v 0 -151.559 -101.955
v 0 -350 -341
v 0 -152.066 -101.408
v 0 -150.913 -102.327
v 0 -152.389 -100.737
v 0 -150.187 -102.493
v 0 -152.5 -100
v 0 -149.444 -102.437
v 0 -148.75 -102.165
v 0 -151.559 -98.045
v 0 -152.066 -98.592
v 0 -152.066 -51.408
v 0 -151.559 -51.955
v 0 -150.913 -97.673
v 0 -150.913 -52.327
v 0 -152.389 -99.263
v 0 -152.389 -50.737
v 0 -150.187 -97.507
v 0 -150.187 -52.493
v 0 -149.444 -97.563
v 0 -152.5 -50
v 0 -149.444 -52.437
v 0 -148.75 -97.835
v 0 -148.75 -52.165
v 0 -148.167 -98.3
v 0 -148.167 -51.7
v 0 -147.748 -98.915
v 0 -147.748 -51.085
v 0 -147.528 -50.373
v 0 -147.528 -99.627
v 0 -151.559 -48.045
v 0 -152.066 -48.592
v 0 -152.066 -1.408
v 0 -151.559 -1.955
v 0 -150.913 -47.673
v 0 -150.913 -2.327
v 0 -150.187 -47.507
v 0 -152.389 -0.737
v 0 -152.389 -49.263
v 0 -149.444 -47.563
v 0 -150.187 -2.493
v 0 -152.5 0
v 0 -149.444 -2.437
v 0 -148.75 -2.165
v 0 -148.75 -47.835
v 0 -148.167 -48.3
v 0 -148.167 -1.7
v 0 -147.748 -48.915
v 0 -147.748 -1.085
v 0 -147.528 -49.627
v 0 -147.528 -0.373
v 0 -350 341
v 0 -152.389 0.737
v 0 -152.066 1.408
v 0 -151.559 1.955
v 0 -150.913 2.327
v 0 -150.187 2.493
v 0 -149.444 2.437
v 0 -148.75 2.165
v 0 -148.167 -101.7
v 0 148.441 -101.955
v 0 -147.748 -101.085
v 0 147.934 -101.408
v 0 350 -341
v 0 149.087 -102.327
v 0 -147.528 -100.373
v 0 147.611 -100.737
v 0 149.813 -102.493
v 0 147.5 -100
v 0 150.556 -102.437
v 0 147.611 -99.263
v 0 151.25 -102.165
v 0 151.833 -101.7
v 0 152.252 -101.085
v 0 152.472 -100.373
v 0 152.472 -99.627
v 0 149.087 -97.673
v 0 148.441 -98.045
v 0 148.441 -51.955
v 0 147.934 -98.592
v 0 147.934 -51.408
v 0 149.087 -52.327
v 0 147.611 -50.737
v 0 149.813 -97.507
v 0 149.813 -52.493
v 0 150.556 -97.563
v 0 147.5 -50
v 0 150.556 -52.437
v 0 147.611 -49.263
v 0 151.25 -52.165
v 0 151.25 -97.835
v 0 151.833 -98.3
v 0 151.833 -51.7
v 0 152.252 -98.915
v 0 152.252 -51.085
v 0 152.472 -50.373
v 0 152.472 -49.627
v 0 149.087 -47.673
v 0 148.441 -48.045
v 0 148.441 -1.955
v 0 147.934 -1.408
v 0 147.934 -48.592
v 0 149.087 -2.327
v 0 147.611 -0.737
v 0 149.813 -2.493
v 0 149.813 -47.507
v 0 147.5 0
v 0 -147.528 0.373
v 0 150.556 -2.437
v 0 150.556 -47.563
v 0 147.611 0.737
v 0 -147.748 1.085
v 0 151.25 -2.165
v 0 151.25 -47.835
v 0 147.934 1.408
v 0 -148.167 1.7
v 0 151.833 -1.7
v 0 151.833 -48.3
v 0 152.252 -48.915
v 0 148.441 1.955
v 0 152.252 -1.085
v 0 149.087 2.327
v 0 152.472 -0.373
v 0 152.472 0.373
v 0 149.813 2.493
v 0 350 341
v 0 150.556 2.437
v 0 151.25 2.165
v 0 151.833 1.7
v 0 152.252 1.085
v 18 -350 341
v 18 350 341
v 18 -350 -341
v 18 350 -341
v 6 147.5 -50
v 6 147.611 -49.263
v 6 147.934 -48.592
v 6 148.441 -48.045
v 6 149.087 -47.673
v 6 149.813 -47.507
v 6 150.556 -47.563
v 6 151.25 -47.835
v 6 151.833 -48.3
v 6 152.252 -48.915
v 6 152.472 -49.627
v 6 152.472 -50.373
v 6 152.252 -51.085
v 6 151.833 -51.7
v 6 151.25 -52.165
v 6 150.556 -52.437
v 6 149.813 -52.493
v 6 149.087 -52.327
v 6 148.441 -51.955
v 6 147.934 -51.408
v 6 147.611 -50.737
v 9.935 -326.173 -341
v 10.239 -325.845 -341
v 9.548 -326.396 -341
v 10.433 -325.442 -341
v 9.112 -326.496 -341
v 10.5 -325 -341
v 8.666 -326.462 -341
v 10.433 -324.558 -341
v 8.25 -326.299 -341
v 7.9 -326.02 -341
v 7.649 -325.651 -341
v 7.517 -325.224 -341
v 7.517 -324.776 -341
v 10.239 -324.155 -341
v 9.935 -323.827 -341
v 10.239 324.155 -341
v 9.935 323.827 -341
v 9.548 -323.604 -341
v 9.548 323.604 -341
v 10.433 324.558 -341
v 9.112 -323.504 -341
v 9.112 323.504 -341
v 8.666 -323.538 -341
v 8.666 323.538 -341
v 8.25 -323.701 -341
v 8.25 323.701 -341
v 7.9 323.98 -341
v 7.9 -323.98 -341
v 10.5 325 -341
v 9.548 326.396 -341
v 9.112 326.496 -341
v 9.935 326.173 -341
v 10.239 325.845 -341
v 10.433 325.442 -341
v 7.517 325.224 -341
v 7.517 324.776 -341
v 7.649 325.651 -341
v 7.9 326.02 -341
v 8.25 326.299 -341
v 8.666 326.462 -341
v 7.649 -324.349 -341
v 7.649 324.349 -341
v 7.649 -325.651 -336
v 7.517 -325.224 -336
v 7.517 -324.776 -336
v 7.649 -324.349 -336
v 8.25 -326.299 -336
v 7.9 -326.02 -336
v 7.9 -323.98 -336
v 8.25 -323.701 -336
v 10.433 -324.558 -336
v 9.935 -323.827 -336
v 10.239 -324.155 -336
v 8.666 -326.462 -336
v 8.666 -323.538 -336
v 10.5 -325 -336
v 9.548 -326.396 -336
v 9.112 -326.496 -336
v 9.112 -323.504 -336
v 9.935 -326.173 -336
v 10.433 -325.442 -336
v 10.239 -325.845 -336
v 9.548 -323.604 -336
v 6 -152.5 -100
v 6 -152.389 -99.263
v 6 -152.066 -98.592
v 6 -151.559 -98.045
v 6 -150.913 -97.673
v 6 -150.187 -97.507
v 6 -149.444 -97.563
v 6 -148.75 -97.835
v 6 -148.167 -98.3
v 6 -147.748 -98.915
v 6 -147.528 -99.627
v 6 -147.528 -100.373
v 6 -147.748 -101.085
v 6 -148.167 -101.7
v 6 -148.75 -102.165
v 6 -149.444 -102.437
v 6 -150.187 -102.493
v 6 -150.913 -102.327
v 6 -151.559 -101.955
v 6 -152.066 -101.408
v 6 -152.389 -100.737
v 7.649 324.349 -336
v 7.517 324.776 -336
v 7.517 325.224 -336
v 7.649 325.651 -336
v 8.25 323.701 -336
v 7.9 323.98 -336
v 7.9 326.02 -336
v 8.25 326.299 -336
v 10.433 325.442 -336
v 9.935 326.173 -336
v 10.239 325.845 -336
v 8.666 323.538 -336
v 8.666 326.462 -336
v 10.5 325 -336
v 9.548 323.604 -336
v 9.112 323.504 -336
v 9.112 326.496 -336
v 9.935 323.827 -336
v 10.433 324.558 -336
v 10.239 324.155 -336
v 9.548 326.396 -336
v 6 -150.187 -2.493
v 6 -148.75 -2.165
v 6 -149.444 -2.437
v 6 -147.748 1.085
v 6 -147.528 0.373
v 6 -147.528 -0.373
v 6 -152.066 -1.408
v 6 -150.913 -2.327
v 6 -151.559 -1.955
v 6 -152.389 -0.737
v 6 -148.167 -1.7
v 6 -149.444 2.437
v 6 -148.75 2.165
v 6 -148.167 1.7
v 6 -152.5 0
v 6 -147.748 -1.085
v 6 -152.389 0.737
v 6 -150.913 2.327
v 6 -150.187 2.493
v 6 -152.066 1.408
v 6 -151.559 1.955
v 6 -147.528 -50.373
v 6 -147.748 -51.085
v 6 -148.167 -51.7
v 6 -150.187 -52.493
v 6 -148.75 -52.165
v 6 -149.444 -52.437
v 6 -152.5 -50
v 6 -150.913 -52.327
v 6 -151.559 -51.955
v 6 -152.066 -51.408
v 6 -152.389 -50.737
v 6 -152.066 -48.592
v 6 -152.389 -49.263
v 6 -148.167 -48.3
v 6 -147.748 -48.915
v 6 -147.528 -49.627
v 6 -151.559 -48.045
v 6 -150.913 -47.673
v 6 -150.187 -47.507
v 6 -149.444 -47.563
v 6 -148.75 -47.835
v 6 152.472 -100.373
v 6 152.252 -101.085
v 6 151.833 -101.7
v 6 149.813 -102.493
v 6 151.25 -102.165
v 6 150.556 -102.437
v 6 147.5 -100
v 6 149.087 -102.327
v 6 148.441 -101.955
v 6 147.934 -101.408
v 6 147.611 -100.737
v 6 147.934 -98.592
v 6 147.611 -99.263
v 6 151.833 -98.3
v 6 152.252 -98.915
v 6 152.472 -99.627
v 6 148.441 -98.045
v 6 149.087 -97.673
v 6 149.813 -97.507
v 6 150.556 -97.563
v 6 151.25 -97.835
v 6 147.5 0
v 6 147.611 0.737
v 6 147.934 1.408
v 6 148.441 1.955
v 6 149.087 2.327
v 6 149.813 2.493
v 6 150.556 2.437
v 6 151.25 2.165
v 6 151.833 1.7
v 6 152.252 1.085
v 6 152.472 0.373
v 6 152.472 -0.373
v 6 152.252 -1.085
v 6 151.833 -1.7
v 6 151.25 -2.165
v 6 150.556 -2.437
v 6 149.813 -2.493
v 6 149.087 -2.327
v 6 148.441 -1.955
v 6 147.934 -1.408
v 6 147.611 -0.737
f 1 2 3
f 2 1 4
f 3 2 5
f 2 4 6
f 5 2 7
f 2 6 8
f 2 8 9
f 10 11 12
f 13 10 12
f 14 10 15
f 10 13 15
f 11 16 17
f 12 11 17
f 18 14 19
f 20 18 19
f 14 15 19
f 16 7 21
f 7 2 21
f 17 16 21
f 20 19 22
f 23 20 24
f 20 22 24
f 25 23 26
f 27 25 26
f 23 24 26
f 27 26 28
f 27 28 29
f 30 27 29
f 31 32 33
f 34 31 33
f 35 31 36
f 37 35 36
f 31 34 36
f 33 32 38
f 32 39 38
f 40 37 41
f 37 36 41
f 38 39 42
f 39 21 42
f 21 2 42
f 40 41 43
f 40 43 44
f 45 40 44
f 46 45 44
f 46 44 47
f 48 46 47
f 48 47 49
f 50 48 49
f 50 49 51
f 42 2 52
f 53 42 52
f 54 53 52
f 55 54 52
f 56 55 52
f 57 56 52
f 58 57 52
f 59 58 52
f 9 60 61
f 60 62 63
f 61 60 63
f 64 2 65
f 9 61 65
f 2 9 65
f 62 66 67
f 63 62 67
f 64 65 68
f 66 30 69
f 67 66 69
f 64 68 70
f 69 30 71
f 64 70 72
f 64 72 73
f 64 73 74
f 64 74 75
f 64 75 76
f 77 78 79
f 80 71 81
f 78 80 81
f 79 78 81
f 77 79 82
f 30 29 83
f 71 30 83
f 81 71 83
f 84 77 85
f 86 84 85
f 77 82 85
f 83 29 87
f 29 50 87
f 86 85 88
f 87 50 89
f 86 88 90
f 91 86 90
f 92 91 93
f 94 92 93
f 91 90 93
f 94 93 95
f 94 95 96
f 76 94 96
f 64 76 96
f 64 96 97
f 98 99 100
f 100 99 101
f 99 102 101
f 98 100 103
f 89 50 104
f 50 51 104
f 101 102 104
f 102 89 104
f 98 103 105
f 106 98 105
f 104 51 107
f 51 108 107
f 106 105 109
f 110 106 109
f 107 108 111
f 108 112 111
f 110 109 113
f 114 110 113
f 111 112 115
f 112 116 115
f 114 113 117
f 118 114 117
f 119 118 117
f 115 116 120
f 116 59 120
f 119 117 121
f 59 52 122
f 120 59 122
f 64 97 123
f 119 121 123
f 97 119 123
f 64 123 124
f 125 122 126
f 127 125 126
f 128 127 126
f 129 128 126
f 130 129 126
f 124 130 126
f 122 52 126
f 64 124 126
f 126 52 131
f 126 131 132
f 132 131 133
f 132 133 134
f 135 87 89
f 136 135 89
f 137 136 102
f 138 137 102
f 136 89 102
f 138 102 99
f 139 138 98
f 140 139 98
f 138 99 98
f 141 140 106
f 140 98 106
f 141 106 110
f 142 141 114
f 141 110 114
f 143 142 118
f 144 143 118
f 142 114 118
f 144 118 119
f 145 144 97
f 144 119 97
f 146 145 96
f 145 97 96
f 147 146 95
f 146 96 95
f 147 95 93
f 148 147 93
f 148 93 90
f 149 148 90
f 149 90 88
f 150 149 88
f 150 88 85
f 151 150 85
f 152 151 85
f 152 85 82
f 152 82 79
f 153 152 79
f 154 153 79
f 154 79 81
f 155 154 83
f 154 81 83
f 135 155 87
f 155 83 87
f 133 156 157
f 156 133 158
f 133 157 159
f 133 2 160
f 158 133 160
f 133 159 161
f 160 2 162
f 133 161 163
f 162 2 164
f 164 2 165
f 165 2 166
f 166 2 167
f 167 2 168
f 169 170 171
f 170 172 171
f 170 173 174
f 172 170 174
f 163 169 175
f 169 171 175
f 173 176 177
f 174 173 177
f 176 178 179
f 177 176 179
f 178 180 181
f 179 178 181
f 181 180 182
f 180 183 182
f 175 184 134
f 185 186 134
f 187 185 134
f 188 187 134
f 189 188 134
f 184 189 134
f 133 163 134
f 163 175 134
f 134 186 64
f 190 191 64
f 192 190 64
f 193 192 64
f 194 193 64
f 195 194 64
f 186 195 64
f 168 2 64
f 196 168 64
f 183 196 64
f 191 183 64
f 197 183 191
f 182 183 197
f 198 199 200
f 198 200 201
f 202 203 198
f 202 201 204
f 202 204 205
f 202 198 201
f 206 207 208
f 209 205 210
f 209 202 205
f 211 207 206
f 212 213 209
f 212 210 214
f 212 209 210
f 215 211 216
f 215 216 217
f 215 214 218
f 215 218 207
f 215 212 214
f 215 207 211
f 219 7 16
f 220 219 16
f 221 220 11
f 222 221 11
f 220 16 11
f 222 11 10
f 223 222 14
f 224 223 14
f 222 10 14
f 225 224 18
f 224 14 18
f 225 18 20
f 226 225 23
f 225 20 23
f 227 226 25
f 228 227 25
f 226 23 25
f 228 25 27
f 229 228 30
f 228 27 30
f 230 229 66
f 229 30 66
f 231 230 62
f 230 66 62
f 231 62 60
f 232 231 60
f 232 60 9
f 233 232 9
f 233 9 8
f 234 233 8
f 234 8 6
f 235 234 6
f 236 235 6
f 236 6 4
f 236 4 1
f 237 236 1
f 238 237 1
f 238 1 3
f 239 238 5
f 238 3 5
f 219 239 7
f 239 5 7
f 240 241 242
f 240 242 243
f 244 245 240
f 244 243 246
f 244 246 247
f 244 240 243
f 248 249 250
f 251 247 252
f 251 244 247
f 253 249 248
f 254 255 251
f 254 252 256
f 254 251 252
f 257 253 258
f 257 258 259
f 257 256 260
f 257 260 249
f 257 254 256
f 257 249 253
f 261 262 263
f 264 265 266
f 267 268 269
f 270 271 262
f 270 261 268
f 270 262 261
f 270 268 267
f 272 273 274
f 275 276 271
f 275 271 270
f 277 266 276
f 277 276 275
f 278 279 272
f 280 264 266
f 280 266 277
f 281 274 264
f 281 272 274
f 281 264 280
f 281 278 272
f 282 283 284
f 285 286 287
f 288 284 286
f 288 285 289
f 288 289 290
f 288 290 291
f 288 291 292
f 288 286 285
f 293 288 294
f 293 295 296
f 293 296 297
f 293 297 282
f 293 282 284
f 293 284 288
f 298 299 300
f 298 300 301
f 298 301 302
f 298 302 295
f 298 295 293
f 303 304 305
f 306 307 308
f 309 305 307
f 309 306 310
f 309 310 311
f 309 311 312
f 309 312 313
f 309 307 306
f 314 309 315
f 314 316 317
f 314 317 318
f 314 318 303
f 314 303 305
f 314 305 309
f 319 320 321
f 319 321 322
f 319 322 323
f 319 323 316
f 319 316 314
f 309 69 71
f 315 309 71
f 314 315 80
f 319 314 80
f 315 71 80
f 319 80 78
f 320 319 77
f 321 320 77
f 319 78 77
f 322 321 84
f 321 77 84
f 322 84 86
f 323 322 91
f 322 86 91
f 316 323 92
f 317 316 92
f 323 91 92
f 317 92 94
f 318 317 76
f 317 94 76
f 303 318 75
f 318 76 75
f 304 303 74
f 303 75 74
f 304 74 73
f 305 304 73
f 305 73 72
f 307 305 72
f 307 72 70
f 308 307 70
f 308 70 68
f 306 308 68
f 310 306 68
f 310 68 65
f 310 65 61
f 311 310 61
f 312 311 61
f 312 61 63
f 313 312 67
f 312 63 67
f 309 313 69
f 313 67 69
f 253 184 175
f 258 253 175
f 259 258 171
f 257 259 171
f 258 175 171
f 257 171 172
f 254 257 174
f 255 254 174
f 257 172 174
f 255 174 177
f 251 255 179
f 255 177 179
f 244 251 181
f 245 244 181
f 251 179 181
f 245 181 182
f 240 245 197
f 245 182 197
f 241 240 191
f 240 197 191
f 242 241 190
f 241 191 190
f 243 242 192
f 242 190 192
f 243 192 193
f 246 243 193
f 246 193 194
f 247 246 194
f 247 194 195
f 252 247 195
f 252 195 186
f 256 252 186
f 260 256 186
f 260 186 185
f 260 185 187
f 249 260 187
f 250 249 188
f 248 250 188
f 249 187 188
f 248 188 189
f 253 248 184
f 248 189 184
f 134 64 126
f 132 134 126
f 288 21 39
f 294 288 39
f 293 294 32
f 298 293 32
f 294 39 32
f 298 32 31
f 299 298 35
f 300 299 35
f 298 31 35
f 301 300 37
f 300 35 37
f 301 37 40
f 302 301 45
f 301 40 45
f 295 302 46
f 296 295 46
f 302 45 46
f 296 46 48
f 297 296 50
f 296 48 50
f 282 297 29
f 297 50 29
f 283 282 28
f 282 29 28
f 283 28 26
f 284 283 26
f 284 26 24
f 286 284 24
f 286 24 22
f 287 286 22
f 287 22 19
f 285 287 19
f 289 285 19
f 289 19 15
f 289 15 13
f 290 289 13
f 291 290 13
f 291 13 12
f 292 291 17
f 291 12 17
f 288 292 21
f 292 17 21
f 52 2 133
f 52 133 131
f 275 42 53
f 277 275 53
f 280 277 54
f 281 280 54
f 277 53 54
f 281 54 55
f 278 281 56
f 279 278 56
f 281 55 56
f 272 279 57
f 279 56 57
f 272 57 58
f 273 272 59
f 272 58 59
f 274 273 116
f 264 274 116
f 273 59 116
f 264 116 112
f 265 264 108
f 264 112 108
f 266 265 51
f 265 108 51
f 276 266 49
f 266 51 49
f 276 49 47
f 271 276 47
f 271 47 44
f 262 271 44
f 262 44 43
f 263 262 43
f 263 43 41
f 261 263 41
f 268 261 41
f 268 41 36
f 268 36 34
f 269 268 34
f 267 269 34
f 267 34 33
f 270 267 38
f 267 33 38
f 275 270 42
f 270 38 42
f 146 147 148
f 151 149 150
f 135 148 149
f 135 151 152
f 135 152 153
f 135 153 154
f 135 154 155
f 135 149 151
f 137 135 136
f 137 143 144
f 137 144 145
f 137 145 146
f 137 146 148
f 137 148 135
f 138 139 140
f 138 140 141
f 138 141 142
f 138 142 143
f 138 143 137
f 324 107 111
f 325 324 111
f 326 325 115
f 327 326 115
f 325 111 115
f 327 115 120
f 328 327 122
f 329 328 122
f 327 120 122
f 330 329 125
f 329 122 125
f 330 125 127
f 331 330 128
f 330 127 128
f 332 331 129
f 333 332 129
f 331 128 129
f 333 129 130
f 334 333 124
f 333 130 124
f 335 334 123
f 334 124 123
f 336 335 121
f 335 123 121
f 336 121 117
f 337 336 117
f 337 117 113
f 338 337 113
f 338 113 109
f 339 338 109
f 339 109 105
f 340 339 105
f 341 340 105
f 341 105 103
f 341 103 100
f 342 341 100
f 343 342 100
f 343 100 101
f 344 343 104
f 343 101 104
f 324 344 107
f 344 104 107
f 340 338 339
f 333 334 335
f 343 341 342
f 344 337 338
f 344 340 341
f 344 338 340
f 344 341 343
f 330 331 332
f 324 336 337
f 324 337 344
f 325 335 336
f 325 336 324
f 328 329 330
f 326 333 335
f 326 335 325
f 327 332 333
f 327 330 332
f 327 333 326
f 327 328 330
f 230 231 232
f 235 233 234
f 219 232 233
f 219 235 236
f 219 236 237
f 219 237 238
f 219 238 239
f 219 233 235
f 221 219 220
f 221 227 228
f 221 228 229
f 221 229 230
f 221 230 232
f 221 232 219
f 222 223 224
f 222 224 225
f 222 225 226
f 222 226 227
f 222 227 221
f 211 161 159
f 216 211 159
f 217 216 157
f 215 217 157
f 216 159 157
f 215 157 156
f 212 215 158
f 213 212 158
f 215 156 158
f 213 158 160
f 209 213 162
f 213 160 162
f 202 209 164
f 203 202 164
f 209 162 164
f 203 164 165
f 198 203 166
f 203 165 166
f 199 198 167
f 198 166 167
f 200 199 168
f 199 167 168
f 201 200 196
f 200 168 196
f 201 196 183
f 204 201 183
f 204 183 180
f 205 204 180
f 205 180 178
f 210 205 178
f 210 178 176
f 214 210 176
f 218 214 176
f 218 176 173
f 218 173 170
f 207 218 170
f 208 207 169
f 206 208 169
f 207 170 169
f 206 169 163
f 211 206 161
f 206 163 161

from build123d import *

# Parameters (mm, degrees)
F0_W     = 700
F0_H     = 682
F1_DEPTH = 18
F2_R     = 1.5
F3_DEPTH = 5
F4_R     = 2.5
F5_DEPTH = 6


with BuildPart() as f1:
    # F0 (on Right) → F1 (new body)
    with BuildSketch(Plane.YZ):
        Rectangle(F0_W, F0_H)
    extrude(amount=F1_DEPTH)

    # F2 (on face) → F3 (cut)
    with BuildSketch(Plane(origin=(0, 0, -341), x_dir=(1, 0, 0), z_dir=(0, 0, -1))):
        with Locations((9, 325)):
            Circle(F2_R)
        with Locations((9, -325)):
            Circle(F2_R)
    extrude(amount=-F3_DEPTH, mode=Mode.SUBTRACT)

    # F4 (on face) → F5 (cut)
    with BuildSketch(Plane(origin=(0, 0, 0), x_dir=(0, -1, 0), z_dir=(-1, 0, 0))):
        with Locations((-150, 0)):
            Circle(F4_R)
        with Locations((150, 0)):
            Circle(F4_R)
        with Locations((-150, -50)):
            Circle(F4_R)
        with Locations((150, -50)):
            Circle(F4_R)
        with Locations((-150, -100)):
            Circle(F4_R)
        with Locations((150, -100)):
            Circle(F4_R)
    extrude(amount=-F5_DEPTH, mode=Mode.SUBTRACT)


solid = f1.part
